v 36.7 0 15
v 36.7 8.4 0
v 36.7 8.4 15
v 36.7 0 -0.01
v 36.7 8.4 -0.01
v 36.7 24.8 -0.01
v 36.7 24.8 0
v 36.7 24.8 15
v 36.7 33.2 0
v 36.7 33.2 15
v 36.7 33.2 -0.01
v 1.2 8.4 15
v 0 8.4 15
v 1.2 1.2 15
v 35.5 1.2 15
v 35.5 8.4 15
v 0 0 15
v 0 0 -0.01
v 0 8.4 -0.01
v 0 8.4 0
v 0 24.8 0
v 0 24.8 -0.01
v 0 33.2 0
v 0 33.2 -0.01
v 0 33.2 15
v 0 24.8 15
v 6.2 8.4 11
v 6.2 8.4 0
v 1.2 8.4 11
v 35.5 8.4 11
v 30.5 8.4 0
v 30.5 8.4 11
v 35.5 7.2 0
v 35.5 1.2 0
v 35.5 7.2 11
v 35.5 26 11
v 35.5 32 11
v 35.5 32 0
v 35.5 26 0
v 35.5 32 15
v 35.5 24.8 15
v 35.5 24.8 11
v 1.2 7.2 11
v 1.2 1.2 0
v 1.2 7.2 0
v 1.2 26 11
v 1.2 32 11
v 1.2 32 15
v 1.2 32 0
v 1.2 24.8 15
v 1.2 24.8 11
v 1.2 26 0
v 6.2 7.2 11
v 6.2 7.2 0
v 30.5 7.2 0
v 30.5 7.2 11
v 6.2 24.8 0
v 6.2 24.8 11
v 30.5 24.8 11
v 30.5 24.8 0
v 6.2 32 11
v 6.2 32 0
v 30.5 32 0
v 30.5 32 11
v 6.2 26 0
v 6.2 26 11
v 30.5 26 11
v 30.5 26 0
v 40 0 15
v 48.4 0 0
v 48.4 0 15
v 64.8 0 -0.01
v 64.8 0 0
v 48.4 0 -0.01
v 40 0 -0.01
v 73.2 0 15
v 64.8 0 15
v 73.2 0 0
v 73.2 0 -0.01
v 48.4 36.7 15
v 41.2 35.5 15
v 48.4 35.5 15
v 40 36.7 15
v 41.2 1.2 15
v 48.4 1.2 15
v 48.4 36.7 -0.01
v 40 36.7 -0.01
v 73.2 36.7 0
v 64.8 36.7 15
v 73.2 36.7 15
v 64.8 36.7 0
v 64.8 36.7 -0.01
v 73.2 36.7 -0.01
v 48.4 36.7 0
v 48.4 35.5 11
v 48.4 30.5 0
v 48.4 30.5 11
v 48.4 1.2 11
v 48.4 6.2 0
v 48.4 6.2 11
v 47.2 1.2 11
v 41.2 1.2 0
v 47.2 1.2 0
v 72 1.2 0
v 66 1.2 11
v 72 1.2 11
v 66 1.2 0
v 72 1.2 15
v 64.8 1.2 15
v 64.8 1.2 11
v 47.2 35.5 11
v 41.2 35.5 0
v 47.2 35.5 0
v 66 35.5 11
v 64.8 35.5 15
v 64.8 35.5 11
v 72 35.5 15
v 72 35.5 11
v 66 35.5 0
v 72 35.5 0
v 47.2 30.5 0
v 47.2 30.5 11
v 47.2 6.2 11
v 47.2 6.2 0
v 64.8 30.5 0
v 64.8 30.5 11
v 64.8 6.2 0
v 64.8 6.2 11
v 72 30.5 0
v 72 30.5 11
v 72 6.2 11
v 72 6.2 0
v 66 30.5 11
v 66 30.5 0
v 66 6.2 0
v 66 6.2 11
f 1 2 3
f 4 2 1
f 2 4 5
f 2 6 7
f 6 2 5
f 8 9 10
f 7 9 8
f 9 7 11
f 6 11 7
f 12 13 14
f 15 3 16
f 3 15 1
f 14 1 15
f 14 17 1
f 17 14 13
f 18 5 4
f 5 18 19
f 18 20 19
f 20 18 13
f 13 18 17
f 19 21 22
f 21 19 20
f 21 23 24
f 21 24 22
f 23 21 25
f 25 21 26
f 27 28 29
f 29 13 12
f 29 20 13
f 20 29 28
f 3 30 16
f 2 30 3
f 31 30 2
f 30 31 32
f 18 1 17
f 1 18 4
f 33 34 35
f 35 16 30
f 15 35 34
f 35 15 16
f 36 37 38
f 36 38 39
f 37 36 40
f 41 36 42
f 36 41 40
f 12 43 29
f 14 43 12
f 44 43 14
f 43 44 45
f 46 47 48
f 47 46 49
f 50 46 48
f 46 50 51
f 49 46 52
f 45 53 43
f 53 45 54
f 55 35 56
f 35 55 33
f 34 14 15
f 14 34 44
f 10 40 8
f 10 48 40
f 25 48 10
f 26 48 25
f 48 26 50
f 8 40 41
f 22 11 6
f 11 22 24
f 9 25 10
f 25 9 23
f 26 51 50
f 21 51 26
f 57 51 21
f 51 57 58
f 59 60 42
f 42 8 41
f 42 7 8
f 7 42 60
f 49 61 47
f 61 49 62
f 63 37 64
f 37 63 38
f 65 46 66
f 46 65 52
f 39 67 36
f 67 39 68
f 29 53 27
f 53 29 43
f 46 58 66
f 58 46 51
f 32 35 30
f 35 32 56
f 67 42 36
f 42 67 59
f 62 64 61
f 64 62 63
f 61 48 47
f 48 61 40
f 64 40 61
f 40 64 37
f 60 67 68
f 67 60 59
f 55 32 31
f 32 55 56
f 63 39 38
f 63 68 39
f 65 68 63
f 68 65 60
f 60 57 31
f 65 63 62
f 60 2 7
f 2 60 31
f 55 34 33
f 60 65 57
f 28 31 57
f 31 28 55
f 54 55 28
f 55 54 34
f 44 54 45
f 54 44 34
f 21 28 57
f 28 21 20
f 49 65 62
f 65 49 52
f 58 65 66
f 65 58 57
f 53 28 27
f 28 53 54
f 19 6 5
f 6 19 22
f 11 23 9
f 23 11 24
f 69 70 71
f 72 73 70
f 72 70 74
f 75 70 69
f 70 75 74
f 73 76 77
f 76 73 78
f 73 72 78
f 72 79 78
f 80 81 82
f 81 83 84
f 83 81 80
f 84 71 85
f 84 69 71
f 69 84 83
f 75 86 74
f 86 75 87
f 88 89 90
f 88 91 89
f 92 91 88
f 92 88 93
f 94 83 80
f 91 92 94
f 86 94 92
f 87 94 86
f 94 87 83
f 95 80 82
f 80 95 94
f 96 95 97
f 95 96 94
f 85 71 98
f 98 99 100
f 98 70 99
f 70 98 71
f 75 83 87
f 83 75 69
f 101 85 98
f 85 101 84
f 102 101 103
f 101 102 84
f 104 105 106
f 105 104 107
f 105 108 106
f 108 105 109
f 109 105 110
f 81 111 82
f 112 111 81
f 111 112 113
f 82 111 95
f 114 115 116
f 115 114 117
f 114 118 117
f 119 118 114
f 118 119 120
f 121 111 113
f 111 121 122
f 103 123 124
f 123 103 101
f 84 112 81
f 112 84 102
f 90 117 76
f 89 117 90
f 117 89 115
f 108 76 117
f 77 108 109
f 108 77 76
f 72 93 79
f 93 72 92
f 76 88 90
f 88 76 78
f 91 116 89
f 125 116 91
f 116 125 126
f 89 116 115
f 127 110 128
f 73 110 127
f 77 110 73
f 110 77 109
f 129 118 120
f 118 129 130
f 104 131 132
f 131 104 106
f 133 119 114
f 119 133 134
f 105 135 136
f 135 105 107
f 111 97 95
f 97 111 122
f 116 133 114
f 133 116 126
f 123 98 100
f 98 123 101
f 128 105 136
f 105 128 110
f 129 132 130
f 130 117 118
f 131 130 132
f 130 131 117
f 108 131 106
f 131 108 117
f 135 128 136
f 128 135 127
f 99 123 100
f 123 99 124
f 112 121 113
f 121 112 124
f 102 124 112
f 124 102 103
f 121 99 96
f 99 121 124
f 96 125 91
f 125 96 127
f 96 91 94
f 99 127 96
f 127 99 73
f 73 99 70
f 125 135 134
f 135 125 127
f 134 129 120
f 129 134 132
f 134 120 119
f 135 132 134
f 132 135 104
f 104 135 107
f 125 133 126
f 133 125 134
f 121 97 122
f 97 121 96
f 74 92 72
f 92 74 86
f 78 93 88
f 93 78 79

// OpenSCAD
// file: ../../Base/Boxes.scad
// Fischertechnik Box Foundation
// Pre-designed Boxes

use <Constants.scad>

include <PlacementOptions.scad>

box190Width = 190;
box190Depth = 130;
box130Width = 130;
box130Depth = 95;
boxUsageHeight = 33.9;
boxWallThickness = 2.4;
boxBaseThickness = 1.0;

// getBoxWallThickness()
// Gets the wall thickness of a Fischertechnik Box

function getBoxWallThickness() = boxWallThickness;

// Gets the usable height of a fischertechnik box
function getBoxUsageHeight() = boxUsageHeight;

// Gets the thickness of the Fischertechnik box base.
function getBoxBaseThickness() = boxBaseThickness;

// Gets the usable inner space of a Box 190 as an x/y-list
function getBox190Space() = [
    box190Width - 2*getBoxWallThickness(), 
    box190Depth - 2*getBoxWallThickness() ];

// Imports the Fischertechnik empty box 130x190 mm and places it at position 0,0
// 190x130 are the outer sizes, the inner space is slightly smaller. Use getBox190Space() to get the inner sizes.
// This module needs the STL file "Fischertechnik Box 130x190.stl" in the library path.
// The box is positioned that the usable inner space is at the 0,0,0 position. The

module Box190() {
    translate([-getBoxWallThickness(),-getBoxWallThickness(),-getBoxBaseThickness()])
        import("Fischertechnik Box 130x190.stl", convexity=3);
}

// Gets the usable inner space of a Box 130 as an x/y-list
function getBox130Space() = [
    box130Width - 2*getBoxWallThickness(), 
    box130Depth - 2*getBoxWallThickness() ];

// Imports the Fischertechnik empty box 95x130 mm and places it at position 0,0
// 190x130 are the outer sizes, the inner space is slightly smaller. Use getBox190Space() to get the inner sizes.
// This module needs the STL file "Fischertechnik Box 95x130.stl" in the library path.
// The box is positioned that the usable inner space is at the 0,0,0 position. The

module Box130() {
    translate([-getBoxWallThickness(),-getBoxWallThickness(),-getBoxBaseThickness()])
        import("Fischertechnik Box 95x130.stl", convexity=3);
}

// Creates a web at the specified box walls
// corner 0 = LowerLeft, 1 = UpperLeft, 2 = UpperRight, 3 = LowerRight
// side 0 = LeftOfCorner, 1 = RightOfCorner
// distance = Distance in mm from the corner
// box = inner width and depth of the box (default: Box 190)
// webWidth = length of the web (default is 3 mms)
// webThickness = thickness of the web (default is 1 mm)

module BoxWeb(corner, side, distance, box=getBox190Space(), webWidth=3, webThickness=1.0) {
    sink = getBoxWallThickness()/2;

    width = (corner % 2 == 0) ? 
            (side == LeftOfCorner ? webWidth : webThickness) :
            (side == LeftOfCorner ? webThickness : webWidth);

    depth = (corner % 2 == 0) ? 
            (side == RightOfCorner ? webWidth : webThickness) :
            (side == RightOfCorner ? webThickness : webWidth);
    
    xDiff = corner == LowerLeft ? 
                (side == LeftOfCorner ? -sink : distance) :
            (corner == UpperLeft ?                
                (side == LeftOfCorner ? distance : -sink) :
            (corner == UpperRight ?
                (side == LeftOfCorner ? box.x-webWidth+sink : box.x-distance-webThickness) :
                (side == LeftOfCorner ? box.x-distance-webThickness: box.x-webWidth+sink)));

    yDiff = corner == LowerLeft ? 
                (side == RightOfCorner ? -sink : distance) :
            (corner == UpperLeft ?
                (side == RightOfCorner ? box.y-distance : box.y-webWidth+sink) :
            (corner == UpperRight ?
                (side == RightOfCorner ? box.y-webWidth+sink : box.y-distance) :
                (side == RightOfCorner ? distance : -sink)));
    
    translate([xDiff, yDiff, -getExcess()])
        cube([width, depth, boxUsageHeight + 2*getExcess()]);
}
// file: ../../Base/Rotation.scad
// Fischertechnik Box Foundation
// Geometry Helpers Rotation

include <PlacementOptions.scad>

// getRotatedSpace(space, rotation=NoRotation)
// Rotates the space dependent on the specified rotation

function getRotatedSpace(space, rotation=NoRotation) = [
    (rotation == Rotate90 || rotation == Rotate270) ? space.y : space.x,
    (rotation == Rotate90 || rotation == Rotate270) ? space.x : space.y
];

// Rotates the given space around the fixed left lower corner
// space = the space the children needs as width/depth list [width,depth]
// rotation = 0 Rotate0 degrees, 1 Rotate90 degrees, 2 Rotate180 degrees, 3 Rotate270 degrees (equivalent to -90)

module RotateFix(space, rotation=Rotate0) {
    dy = (rotation == Rotate0 || rotation == Rotate270) ? 0 :
        (rotation == Rotate90) ? space.x :
        space.y;
    dx = (rotation < Rotate180) ? 0 :
        (rotation == Rotate180) ? space.x :
        space.y;
    
    translate([dx, dy, 0])
        rotate([0, 0, rotations[rotation]])
            children();
}
// file: ../../Base/Alignment.scad
// Fischertechnik Box Foundation
// Geometry Helpers Alignment

include <PlacementOptions.scad>

// getAlignedX(elementWidth, spaceWidth, align=AlignRight, offset=0)
// Gets the aligned X offset of an element with the given
// width in the given space.
// elementWidth = The width of the element to positon
// spaceWidth = The space where the element should be aligned
// align = 0 AlignLeft, 1 AlignCenter, 2 AlignRight
// offset = an optional offset from the aligned position. When
// aligned left or centered, then positive values are in X direction.
// When aligned right then positive values are in negative X direction.

function getAlignedX(elementWidth, spaceWidth, align=AlignRight, offset=0) =
    (align == AlignLeft) ?
        offset :
        ((align == AlignCenter) ?
        (spaceWidth - elementWidth)/2 + offset :
        spaceWidth - offset - elementWidth);

// getAlignedY(elementDepth, spaceDepth, align=AlignTop, offset=0)
// Gets the aligned Y offset of an element with the given
// depth in the given space.
// elementDepth = The depth of the element to positon
// spaceDepth = The space where the element should be aligned
// align = 0 AlignBottom, 1 AlignCenter, 2 AlignTop
// offset = an optional offset from the aligned position. When
// aligned bottom or centered, then positive values are in Y direction.
// When aligned top then positive values are in negative Y direction.

function getAlignedY(elementDepth, spaceDepth, align=AlignTop, offset=0) =
    (align == AlignBottom) ?
        offset :
        ((align == AlignCenter) ?
        (spaceDepth - elementDepth)/2 + offset :
        spaceDepth - offset - elementDepth);
// file: ../../Base/Constants.scad
// Fischertechnik Box Foundation
// Constants

// Constant values necessary for multiple elements

// Base constants
dividerThickness = 1.2;
excess = 0.01;
fragments = 90;
tolerance = 0.8;

// Gets the thickness of a divider 
function getDividerThickness() = dividerThickness;

// Gets the excess that is used to merge walls into each other
function getExcess() = excess;

// Gets amount of fragments of a cylinder
function getFragments() = fragments;

// Gets the inner tolerance of a frame to each side
function getTolerance() = tolerance;


// Fischertechnik specific constants
axisDiameter = 4;
axisBottomDiameter = axisDiameter + 1;
standardEdgeDistance = 2.5;
standardWebDistance = 11.5;
standardCornerLength = 15;
tubeWallFactor = 1.6;

// Gets axis diameter
function getAxisDiameter() = axisDiameter;

// Gets axis bottom diameter for thicker part at the bottom
function getAxisBottomDiameter() = axisBottomDiameter;

// gets the standard distance to the wall of the box for dockable frames with webs
function getStandardEdgeDistance() = standardEdgeDistance;

// gets the standard distance of each web to the corner of the dockable frame
function getStandardWebDistance() = standardWebDistance;

// gets the standard length of the corner walls of a dockable frame
function getStandardCornerLength() = standardCornerLength;

// gets the wall thickness of a tube.
function getTubeWallThickness() = tubeWallFactor * getDividerThickness();
// file: ../../Base/PlacementOptions.scad
// Fischertechnik Box Foundation
// Placement Options

// Alignment
NoAlign = 0;
AlignLeft = 1;
AlignBottom = 2;
AlignCenter = 3;
AlignRight = 4;
AlignTop = 5;

// Element rotation degree steps
rotations = [0, -90, -180, -270];

// Rotation
NoRotation = 0;
Rotate0 = 0;
Rotate90 = 1;
Rotate180 = 2;
Rotate270 = 3;

// Docking (seen from above)
NoDock = -1;
DockLeft = 0;
DockTop = 1;
DockRight = 2;
DockCorner = 2;
DockBottom = 3;

// Web corners
LowerLeft = 0;
UpperLeft = 1;
UpperRight = 2;
LowerRight = 3;

// Web position relative to corner
LeftOfCorner = 0;
RightOfCorner = 1;
// file: ../../Elements/FrameAperture.scad
// Fischertechnik Box Library
// Frame for Pinhole, Slit Aperture, and Cross Aperture
// 31371, 31372, 31373 

use <../Base/Constants.scad>
use <../ModelBase/Simple.scad>
use <../ModelBase/Complex.scad>

width = 33.5;
depth = 30;
height = 11;

// getFrameApertureSpace()
// Gets the outer space the aperture frame needs.

function getFrameApertureSpace() = getFrameOuterVolume([width, depth, height]);

// FrameAperture()
// Frame for 30 mm flat slit or cross aperture.

module FrameAperture() {
    FrameSpecialFlat([width, depth, height]);
}

// Tests
color("lightgray") {
FrameAperture();
}
// file: ../../Base/Placement.scad
// Fischertechnik Box Foundation
// Geometry Helpers Placement

use <Constants.scad>
use <Alignment.scad>
use <Rotation.scad>
use <Boxes.scad>

include <PlacementOptions.scad>

// Place(x=0, y=0, elementSpace=[0,0], alignX=AlignLeft, alignY=AlignBottom, rotation=Rotate0, boxSpace=getBox190Space())
// Places the child at the specified position
// y = Y-Position. This is a relative position when an X aligment is specified.
// x = X-Position. This is a relative position when an Y aligment is specified.
// elementSpace = space of the element to be placed [x,y]
// alignX = -1=NoAlign, 0 AlignLeft, 1 AlignCenter, 3 AlignRight (elementSpace and boxSpace required!)
// alignY = -1=NoAlign, 2 AlignBottom, 1 AlignCenter, 4 AlignTop (elementSpace and boxSpace required!)
// rotation = 0 Rotate0 0 degrees, 1 Rotate90 90 degrees, 
// 2 Rotate180 180 degrees, 3 Rotate270 270 degrees (equivalent to -90)
// boxSpace = Inner space of the box where the placement occurs [x,y] - default is Box 190x130 inner space

module Place(x=0, y=0, elementSpace=[0,0], 
  alignX=AlignLeft, alignY=AlignBottom, 
  rotation=NoRotation, boxSpace=getBox190Space()) {

    module Position(x, y, space, rotation=Rotate0) {
        translate([x, y, 0])
            RotateFix(space, rotation)
                children(0);
    }

    space = getRotatedSpace(elementSpace, rotation);
    alignedX = getAlignedX(space.x, boxSpace.x, alignX, x);
    alignedY = getAlignedY(space.y, boxSpace.y, alignY, y);
    Position(alignedX, alignedY, elementSpace, rotation)
        children(0);
}

// Center(space=getBox130Space(), elementSpace=[0,0])
// space = Space where the children is centered. For cylinder use centered=true and no elementSpace.
// elementSpace = space of the element to be centered [x,y]

module Center(space=getBox190Space(), elementSpace=[0,0]) {
    translate([(space.x - elementSpace.x) / 2, (space.y - elementSpace.y) / 2])
        children(0);
}

// CenterHorizontal(width=0, y=0, offset=0, space=getBox130Space())
// space = Space where the children is centered. For cylinder use centered=true and no elementSpace.
// elementSpace = space of the element to be centered [x,y]

module CenterHorizontal(width=0, y=0, offset=0, space=getBox190Space()) {
    translate([(space.x - width) / 2 + offset, y])
        children(0);
}

// CenterVertical(depth=0, x=0, offset=0, space=getBox130Space())
// space = Space where the children is centered. For cylinder use centered=true and no elementSpace.
// elementSpace = space of the element to be centered [x,y]

module CenterVerticalal(depth=0, x=0, offset=0, space=getBox190Space()) {
    translate([x, (space.y - depth) / 2 + offset])
        children(0);
}
// main file
// Fischertechnik Box Foundation
// Elements
// Test FrameAperture

use <../../Base/Placement.scad>
use <../../Elements/FrameAperture.scad>

include <../../Base/PlacementOptions.scad>

FrameAperture();

Place(40, 0, elementSpace=getFrameApertureSpace(), rotation=Rotate90)
    FrameAperture();
